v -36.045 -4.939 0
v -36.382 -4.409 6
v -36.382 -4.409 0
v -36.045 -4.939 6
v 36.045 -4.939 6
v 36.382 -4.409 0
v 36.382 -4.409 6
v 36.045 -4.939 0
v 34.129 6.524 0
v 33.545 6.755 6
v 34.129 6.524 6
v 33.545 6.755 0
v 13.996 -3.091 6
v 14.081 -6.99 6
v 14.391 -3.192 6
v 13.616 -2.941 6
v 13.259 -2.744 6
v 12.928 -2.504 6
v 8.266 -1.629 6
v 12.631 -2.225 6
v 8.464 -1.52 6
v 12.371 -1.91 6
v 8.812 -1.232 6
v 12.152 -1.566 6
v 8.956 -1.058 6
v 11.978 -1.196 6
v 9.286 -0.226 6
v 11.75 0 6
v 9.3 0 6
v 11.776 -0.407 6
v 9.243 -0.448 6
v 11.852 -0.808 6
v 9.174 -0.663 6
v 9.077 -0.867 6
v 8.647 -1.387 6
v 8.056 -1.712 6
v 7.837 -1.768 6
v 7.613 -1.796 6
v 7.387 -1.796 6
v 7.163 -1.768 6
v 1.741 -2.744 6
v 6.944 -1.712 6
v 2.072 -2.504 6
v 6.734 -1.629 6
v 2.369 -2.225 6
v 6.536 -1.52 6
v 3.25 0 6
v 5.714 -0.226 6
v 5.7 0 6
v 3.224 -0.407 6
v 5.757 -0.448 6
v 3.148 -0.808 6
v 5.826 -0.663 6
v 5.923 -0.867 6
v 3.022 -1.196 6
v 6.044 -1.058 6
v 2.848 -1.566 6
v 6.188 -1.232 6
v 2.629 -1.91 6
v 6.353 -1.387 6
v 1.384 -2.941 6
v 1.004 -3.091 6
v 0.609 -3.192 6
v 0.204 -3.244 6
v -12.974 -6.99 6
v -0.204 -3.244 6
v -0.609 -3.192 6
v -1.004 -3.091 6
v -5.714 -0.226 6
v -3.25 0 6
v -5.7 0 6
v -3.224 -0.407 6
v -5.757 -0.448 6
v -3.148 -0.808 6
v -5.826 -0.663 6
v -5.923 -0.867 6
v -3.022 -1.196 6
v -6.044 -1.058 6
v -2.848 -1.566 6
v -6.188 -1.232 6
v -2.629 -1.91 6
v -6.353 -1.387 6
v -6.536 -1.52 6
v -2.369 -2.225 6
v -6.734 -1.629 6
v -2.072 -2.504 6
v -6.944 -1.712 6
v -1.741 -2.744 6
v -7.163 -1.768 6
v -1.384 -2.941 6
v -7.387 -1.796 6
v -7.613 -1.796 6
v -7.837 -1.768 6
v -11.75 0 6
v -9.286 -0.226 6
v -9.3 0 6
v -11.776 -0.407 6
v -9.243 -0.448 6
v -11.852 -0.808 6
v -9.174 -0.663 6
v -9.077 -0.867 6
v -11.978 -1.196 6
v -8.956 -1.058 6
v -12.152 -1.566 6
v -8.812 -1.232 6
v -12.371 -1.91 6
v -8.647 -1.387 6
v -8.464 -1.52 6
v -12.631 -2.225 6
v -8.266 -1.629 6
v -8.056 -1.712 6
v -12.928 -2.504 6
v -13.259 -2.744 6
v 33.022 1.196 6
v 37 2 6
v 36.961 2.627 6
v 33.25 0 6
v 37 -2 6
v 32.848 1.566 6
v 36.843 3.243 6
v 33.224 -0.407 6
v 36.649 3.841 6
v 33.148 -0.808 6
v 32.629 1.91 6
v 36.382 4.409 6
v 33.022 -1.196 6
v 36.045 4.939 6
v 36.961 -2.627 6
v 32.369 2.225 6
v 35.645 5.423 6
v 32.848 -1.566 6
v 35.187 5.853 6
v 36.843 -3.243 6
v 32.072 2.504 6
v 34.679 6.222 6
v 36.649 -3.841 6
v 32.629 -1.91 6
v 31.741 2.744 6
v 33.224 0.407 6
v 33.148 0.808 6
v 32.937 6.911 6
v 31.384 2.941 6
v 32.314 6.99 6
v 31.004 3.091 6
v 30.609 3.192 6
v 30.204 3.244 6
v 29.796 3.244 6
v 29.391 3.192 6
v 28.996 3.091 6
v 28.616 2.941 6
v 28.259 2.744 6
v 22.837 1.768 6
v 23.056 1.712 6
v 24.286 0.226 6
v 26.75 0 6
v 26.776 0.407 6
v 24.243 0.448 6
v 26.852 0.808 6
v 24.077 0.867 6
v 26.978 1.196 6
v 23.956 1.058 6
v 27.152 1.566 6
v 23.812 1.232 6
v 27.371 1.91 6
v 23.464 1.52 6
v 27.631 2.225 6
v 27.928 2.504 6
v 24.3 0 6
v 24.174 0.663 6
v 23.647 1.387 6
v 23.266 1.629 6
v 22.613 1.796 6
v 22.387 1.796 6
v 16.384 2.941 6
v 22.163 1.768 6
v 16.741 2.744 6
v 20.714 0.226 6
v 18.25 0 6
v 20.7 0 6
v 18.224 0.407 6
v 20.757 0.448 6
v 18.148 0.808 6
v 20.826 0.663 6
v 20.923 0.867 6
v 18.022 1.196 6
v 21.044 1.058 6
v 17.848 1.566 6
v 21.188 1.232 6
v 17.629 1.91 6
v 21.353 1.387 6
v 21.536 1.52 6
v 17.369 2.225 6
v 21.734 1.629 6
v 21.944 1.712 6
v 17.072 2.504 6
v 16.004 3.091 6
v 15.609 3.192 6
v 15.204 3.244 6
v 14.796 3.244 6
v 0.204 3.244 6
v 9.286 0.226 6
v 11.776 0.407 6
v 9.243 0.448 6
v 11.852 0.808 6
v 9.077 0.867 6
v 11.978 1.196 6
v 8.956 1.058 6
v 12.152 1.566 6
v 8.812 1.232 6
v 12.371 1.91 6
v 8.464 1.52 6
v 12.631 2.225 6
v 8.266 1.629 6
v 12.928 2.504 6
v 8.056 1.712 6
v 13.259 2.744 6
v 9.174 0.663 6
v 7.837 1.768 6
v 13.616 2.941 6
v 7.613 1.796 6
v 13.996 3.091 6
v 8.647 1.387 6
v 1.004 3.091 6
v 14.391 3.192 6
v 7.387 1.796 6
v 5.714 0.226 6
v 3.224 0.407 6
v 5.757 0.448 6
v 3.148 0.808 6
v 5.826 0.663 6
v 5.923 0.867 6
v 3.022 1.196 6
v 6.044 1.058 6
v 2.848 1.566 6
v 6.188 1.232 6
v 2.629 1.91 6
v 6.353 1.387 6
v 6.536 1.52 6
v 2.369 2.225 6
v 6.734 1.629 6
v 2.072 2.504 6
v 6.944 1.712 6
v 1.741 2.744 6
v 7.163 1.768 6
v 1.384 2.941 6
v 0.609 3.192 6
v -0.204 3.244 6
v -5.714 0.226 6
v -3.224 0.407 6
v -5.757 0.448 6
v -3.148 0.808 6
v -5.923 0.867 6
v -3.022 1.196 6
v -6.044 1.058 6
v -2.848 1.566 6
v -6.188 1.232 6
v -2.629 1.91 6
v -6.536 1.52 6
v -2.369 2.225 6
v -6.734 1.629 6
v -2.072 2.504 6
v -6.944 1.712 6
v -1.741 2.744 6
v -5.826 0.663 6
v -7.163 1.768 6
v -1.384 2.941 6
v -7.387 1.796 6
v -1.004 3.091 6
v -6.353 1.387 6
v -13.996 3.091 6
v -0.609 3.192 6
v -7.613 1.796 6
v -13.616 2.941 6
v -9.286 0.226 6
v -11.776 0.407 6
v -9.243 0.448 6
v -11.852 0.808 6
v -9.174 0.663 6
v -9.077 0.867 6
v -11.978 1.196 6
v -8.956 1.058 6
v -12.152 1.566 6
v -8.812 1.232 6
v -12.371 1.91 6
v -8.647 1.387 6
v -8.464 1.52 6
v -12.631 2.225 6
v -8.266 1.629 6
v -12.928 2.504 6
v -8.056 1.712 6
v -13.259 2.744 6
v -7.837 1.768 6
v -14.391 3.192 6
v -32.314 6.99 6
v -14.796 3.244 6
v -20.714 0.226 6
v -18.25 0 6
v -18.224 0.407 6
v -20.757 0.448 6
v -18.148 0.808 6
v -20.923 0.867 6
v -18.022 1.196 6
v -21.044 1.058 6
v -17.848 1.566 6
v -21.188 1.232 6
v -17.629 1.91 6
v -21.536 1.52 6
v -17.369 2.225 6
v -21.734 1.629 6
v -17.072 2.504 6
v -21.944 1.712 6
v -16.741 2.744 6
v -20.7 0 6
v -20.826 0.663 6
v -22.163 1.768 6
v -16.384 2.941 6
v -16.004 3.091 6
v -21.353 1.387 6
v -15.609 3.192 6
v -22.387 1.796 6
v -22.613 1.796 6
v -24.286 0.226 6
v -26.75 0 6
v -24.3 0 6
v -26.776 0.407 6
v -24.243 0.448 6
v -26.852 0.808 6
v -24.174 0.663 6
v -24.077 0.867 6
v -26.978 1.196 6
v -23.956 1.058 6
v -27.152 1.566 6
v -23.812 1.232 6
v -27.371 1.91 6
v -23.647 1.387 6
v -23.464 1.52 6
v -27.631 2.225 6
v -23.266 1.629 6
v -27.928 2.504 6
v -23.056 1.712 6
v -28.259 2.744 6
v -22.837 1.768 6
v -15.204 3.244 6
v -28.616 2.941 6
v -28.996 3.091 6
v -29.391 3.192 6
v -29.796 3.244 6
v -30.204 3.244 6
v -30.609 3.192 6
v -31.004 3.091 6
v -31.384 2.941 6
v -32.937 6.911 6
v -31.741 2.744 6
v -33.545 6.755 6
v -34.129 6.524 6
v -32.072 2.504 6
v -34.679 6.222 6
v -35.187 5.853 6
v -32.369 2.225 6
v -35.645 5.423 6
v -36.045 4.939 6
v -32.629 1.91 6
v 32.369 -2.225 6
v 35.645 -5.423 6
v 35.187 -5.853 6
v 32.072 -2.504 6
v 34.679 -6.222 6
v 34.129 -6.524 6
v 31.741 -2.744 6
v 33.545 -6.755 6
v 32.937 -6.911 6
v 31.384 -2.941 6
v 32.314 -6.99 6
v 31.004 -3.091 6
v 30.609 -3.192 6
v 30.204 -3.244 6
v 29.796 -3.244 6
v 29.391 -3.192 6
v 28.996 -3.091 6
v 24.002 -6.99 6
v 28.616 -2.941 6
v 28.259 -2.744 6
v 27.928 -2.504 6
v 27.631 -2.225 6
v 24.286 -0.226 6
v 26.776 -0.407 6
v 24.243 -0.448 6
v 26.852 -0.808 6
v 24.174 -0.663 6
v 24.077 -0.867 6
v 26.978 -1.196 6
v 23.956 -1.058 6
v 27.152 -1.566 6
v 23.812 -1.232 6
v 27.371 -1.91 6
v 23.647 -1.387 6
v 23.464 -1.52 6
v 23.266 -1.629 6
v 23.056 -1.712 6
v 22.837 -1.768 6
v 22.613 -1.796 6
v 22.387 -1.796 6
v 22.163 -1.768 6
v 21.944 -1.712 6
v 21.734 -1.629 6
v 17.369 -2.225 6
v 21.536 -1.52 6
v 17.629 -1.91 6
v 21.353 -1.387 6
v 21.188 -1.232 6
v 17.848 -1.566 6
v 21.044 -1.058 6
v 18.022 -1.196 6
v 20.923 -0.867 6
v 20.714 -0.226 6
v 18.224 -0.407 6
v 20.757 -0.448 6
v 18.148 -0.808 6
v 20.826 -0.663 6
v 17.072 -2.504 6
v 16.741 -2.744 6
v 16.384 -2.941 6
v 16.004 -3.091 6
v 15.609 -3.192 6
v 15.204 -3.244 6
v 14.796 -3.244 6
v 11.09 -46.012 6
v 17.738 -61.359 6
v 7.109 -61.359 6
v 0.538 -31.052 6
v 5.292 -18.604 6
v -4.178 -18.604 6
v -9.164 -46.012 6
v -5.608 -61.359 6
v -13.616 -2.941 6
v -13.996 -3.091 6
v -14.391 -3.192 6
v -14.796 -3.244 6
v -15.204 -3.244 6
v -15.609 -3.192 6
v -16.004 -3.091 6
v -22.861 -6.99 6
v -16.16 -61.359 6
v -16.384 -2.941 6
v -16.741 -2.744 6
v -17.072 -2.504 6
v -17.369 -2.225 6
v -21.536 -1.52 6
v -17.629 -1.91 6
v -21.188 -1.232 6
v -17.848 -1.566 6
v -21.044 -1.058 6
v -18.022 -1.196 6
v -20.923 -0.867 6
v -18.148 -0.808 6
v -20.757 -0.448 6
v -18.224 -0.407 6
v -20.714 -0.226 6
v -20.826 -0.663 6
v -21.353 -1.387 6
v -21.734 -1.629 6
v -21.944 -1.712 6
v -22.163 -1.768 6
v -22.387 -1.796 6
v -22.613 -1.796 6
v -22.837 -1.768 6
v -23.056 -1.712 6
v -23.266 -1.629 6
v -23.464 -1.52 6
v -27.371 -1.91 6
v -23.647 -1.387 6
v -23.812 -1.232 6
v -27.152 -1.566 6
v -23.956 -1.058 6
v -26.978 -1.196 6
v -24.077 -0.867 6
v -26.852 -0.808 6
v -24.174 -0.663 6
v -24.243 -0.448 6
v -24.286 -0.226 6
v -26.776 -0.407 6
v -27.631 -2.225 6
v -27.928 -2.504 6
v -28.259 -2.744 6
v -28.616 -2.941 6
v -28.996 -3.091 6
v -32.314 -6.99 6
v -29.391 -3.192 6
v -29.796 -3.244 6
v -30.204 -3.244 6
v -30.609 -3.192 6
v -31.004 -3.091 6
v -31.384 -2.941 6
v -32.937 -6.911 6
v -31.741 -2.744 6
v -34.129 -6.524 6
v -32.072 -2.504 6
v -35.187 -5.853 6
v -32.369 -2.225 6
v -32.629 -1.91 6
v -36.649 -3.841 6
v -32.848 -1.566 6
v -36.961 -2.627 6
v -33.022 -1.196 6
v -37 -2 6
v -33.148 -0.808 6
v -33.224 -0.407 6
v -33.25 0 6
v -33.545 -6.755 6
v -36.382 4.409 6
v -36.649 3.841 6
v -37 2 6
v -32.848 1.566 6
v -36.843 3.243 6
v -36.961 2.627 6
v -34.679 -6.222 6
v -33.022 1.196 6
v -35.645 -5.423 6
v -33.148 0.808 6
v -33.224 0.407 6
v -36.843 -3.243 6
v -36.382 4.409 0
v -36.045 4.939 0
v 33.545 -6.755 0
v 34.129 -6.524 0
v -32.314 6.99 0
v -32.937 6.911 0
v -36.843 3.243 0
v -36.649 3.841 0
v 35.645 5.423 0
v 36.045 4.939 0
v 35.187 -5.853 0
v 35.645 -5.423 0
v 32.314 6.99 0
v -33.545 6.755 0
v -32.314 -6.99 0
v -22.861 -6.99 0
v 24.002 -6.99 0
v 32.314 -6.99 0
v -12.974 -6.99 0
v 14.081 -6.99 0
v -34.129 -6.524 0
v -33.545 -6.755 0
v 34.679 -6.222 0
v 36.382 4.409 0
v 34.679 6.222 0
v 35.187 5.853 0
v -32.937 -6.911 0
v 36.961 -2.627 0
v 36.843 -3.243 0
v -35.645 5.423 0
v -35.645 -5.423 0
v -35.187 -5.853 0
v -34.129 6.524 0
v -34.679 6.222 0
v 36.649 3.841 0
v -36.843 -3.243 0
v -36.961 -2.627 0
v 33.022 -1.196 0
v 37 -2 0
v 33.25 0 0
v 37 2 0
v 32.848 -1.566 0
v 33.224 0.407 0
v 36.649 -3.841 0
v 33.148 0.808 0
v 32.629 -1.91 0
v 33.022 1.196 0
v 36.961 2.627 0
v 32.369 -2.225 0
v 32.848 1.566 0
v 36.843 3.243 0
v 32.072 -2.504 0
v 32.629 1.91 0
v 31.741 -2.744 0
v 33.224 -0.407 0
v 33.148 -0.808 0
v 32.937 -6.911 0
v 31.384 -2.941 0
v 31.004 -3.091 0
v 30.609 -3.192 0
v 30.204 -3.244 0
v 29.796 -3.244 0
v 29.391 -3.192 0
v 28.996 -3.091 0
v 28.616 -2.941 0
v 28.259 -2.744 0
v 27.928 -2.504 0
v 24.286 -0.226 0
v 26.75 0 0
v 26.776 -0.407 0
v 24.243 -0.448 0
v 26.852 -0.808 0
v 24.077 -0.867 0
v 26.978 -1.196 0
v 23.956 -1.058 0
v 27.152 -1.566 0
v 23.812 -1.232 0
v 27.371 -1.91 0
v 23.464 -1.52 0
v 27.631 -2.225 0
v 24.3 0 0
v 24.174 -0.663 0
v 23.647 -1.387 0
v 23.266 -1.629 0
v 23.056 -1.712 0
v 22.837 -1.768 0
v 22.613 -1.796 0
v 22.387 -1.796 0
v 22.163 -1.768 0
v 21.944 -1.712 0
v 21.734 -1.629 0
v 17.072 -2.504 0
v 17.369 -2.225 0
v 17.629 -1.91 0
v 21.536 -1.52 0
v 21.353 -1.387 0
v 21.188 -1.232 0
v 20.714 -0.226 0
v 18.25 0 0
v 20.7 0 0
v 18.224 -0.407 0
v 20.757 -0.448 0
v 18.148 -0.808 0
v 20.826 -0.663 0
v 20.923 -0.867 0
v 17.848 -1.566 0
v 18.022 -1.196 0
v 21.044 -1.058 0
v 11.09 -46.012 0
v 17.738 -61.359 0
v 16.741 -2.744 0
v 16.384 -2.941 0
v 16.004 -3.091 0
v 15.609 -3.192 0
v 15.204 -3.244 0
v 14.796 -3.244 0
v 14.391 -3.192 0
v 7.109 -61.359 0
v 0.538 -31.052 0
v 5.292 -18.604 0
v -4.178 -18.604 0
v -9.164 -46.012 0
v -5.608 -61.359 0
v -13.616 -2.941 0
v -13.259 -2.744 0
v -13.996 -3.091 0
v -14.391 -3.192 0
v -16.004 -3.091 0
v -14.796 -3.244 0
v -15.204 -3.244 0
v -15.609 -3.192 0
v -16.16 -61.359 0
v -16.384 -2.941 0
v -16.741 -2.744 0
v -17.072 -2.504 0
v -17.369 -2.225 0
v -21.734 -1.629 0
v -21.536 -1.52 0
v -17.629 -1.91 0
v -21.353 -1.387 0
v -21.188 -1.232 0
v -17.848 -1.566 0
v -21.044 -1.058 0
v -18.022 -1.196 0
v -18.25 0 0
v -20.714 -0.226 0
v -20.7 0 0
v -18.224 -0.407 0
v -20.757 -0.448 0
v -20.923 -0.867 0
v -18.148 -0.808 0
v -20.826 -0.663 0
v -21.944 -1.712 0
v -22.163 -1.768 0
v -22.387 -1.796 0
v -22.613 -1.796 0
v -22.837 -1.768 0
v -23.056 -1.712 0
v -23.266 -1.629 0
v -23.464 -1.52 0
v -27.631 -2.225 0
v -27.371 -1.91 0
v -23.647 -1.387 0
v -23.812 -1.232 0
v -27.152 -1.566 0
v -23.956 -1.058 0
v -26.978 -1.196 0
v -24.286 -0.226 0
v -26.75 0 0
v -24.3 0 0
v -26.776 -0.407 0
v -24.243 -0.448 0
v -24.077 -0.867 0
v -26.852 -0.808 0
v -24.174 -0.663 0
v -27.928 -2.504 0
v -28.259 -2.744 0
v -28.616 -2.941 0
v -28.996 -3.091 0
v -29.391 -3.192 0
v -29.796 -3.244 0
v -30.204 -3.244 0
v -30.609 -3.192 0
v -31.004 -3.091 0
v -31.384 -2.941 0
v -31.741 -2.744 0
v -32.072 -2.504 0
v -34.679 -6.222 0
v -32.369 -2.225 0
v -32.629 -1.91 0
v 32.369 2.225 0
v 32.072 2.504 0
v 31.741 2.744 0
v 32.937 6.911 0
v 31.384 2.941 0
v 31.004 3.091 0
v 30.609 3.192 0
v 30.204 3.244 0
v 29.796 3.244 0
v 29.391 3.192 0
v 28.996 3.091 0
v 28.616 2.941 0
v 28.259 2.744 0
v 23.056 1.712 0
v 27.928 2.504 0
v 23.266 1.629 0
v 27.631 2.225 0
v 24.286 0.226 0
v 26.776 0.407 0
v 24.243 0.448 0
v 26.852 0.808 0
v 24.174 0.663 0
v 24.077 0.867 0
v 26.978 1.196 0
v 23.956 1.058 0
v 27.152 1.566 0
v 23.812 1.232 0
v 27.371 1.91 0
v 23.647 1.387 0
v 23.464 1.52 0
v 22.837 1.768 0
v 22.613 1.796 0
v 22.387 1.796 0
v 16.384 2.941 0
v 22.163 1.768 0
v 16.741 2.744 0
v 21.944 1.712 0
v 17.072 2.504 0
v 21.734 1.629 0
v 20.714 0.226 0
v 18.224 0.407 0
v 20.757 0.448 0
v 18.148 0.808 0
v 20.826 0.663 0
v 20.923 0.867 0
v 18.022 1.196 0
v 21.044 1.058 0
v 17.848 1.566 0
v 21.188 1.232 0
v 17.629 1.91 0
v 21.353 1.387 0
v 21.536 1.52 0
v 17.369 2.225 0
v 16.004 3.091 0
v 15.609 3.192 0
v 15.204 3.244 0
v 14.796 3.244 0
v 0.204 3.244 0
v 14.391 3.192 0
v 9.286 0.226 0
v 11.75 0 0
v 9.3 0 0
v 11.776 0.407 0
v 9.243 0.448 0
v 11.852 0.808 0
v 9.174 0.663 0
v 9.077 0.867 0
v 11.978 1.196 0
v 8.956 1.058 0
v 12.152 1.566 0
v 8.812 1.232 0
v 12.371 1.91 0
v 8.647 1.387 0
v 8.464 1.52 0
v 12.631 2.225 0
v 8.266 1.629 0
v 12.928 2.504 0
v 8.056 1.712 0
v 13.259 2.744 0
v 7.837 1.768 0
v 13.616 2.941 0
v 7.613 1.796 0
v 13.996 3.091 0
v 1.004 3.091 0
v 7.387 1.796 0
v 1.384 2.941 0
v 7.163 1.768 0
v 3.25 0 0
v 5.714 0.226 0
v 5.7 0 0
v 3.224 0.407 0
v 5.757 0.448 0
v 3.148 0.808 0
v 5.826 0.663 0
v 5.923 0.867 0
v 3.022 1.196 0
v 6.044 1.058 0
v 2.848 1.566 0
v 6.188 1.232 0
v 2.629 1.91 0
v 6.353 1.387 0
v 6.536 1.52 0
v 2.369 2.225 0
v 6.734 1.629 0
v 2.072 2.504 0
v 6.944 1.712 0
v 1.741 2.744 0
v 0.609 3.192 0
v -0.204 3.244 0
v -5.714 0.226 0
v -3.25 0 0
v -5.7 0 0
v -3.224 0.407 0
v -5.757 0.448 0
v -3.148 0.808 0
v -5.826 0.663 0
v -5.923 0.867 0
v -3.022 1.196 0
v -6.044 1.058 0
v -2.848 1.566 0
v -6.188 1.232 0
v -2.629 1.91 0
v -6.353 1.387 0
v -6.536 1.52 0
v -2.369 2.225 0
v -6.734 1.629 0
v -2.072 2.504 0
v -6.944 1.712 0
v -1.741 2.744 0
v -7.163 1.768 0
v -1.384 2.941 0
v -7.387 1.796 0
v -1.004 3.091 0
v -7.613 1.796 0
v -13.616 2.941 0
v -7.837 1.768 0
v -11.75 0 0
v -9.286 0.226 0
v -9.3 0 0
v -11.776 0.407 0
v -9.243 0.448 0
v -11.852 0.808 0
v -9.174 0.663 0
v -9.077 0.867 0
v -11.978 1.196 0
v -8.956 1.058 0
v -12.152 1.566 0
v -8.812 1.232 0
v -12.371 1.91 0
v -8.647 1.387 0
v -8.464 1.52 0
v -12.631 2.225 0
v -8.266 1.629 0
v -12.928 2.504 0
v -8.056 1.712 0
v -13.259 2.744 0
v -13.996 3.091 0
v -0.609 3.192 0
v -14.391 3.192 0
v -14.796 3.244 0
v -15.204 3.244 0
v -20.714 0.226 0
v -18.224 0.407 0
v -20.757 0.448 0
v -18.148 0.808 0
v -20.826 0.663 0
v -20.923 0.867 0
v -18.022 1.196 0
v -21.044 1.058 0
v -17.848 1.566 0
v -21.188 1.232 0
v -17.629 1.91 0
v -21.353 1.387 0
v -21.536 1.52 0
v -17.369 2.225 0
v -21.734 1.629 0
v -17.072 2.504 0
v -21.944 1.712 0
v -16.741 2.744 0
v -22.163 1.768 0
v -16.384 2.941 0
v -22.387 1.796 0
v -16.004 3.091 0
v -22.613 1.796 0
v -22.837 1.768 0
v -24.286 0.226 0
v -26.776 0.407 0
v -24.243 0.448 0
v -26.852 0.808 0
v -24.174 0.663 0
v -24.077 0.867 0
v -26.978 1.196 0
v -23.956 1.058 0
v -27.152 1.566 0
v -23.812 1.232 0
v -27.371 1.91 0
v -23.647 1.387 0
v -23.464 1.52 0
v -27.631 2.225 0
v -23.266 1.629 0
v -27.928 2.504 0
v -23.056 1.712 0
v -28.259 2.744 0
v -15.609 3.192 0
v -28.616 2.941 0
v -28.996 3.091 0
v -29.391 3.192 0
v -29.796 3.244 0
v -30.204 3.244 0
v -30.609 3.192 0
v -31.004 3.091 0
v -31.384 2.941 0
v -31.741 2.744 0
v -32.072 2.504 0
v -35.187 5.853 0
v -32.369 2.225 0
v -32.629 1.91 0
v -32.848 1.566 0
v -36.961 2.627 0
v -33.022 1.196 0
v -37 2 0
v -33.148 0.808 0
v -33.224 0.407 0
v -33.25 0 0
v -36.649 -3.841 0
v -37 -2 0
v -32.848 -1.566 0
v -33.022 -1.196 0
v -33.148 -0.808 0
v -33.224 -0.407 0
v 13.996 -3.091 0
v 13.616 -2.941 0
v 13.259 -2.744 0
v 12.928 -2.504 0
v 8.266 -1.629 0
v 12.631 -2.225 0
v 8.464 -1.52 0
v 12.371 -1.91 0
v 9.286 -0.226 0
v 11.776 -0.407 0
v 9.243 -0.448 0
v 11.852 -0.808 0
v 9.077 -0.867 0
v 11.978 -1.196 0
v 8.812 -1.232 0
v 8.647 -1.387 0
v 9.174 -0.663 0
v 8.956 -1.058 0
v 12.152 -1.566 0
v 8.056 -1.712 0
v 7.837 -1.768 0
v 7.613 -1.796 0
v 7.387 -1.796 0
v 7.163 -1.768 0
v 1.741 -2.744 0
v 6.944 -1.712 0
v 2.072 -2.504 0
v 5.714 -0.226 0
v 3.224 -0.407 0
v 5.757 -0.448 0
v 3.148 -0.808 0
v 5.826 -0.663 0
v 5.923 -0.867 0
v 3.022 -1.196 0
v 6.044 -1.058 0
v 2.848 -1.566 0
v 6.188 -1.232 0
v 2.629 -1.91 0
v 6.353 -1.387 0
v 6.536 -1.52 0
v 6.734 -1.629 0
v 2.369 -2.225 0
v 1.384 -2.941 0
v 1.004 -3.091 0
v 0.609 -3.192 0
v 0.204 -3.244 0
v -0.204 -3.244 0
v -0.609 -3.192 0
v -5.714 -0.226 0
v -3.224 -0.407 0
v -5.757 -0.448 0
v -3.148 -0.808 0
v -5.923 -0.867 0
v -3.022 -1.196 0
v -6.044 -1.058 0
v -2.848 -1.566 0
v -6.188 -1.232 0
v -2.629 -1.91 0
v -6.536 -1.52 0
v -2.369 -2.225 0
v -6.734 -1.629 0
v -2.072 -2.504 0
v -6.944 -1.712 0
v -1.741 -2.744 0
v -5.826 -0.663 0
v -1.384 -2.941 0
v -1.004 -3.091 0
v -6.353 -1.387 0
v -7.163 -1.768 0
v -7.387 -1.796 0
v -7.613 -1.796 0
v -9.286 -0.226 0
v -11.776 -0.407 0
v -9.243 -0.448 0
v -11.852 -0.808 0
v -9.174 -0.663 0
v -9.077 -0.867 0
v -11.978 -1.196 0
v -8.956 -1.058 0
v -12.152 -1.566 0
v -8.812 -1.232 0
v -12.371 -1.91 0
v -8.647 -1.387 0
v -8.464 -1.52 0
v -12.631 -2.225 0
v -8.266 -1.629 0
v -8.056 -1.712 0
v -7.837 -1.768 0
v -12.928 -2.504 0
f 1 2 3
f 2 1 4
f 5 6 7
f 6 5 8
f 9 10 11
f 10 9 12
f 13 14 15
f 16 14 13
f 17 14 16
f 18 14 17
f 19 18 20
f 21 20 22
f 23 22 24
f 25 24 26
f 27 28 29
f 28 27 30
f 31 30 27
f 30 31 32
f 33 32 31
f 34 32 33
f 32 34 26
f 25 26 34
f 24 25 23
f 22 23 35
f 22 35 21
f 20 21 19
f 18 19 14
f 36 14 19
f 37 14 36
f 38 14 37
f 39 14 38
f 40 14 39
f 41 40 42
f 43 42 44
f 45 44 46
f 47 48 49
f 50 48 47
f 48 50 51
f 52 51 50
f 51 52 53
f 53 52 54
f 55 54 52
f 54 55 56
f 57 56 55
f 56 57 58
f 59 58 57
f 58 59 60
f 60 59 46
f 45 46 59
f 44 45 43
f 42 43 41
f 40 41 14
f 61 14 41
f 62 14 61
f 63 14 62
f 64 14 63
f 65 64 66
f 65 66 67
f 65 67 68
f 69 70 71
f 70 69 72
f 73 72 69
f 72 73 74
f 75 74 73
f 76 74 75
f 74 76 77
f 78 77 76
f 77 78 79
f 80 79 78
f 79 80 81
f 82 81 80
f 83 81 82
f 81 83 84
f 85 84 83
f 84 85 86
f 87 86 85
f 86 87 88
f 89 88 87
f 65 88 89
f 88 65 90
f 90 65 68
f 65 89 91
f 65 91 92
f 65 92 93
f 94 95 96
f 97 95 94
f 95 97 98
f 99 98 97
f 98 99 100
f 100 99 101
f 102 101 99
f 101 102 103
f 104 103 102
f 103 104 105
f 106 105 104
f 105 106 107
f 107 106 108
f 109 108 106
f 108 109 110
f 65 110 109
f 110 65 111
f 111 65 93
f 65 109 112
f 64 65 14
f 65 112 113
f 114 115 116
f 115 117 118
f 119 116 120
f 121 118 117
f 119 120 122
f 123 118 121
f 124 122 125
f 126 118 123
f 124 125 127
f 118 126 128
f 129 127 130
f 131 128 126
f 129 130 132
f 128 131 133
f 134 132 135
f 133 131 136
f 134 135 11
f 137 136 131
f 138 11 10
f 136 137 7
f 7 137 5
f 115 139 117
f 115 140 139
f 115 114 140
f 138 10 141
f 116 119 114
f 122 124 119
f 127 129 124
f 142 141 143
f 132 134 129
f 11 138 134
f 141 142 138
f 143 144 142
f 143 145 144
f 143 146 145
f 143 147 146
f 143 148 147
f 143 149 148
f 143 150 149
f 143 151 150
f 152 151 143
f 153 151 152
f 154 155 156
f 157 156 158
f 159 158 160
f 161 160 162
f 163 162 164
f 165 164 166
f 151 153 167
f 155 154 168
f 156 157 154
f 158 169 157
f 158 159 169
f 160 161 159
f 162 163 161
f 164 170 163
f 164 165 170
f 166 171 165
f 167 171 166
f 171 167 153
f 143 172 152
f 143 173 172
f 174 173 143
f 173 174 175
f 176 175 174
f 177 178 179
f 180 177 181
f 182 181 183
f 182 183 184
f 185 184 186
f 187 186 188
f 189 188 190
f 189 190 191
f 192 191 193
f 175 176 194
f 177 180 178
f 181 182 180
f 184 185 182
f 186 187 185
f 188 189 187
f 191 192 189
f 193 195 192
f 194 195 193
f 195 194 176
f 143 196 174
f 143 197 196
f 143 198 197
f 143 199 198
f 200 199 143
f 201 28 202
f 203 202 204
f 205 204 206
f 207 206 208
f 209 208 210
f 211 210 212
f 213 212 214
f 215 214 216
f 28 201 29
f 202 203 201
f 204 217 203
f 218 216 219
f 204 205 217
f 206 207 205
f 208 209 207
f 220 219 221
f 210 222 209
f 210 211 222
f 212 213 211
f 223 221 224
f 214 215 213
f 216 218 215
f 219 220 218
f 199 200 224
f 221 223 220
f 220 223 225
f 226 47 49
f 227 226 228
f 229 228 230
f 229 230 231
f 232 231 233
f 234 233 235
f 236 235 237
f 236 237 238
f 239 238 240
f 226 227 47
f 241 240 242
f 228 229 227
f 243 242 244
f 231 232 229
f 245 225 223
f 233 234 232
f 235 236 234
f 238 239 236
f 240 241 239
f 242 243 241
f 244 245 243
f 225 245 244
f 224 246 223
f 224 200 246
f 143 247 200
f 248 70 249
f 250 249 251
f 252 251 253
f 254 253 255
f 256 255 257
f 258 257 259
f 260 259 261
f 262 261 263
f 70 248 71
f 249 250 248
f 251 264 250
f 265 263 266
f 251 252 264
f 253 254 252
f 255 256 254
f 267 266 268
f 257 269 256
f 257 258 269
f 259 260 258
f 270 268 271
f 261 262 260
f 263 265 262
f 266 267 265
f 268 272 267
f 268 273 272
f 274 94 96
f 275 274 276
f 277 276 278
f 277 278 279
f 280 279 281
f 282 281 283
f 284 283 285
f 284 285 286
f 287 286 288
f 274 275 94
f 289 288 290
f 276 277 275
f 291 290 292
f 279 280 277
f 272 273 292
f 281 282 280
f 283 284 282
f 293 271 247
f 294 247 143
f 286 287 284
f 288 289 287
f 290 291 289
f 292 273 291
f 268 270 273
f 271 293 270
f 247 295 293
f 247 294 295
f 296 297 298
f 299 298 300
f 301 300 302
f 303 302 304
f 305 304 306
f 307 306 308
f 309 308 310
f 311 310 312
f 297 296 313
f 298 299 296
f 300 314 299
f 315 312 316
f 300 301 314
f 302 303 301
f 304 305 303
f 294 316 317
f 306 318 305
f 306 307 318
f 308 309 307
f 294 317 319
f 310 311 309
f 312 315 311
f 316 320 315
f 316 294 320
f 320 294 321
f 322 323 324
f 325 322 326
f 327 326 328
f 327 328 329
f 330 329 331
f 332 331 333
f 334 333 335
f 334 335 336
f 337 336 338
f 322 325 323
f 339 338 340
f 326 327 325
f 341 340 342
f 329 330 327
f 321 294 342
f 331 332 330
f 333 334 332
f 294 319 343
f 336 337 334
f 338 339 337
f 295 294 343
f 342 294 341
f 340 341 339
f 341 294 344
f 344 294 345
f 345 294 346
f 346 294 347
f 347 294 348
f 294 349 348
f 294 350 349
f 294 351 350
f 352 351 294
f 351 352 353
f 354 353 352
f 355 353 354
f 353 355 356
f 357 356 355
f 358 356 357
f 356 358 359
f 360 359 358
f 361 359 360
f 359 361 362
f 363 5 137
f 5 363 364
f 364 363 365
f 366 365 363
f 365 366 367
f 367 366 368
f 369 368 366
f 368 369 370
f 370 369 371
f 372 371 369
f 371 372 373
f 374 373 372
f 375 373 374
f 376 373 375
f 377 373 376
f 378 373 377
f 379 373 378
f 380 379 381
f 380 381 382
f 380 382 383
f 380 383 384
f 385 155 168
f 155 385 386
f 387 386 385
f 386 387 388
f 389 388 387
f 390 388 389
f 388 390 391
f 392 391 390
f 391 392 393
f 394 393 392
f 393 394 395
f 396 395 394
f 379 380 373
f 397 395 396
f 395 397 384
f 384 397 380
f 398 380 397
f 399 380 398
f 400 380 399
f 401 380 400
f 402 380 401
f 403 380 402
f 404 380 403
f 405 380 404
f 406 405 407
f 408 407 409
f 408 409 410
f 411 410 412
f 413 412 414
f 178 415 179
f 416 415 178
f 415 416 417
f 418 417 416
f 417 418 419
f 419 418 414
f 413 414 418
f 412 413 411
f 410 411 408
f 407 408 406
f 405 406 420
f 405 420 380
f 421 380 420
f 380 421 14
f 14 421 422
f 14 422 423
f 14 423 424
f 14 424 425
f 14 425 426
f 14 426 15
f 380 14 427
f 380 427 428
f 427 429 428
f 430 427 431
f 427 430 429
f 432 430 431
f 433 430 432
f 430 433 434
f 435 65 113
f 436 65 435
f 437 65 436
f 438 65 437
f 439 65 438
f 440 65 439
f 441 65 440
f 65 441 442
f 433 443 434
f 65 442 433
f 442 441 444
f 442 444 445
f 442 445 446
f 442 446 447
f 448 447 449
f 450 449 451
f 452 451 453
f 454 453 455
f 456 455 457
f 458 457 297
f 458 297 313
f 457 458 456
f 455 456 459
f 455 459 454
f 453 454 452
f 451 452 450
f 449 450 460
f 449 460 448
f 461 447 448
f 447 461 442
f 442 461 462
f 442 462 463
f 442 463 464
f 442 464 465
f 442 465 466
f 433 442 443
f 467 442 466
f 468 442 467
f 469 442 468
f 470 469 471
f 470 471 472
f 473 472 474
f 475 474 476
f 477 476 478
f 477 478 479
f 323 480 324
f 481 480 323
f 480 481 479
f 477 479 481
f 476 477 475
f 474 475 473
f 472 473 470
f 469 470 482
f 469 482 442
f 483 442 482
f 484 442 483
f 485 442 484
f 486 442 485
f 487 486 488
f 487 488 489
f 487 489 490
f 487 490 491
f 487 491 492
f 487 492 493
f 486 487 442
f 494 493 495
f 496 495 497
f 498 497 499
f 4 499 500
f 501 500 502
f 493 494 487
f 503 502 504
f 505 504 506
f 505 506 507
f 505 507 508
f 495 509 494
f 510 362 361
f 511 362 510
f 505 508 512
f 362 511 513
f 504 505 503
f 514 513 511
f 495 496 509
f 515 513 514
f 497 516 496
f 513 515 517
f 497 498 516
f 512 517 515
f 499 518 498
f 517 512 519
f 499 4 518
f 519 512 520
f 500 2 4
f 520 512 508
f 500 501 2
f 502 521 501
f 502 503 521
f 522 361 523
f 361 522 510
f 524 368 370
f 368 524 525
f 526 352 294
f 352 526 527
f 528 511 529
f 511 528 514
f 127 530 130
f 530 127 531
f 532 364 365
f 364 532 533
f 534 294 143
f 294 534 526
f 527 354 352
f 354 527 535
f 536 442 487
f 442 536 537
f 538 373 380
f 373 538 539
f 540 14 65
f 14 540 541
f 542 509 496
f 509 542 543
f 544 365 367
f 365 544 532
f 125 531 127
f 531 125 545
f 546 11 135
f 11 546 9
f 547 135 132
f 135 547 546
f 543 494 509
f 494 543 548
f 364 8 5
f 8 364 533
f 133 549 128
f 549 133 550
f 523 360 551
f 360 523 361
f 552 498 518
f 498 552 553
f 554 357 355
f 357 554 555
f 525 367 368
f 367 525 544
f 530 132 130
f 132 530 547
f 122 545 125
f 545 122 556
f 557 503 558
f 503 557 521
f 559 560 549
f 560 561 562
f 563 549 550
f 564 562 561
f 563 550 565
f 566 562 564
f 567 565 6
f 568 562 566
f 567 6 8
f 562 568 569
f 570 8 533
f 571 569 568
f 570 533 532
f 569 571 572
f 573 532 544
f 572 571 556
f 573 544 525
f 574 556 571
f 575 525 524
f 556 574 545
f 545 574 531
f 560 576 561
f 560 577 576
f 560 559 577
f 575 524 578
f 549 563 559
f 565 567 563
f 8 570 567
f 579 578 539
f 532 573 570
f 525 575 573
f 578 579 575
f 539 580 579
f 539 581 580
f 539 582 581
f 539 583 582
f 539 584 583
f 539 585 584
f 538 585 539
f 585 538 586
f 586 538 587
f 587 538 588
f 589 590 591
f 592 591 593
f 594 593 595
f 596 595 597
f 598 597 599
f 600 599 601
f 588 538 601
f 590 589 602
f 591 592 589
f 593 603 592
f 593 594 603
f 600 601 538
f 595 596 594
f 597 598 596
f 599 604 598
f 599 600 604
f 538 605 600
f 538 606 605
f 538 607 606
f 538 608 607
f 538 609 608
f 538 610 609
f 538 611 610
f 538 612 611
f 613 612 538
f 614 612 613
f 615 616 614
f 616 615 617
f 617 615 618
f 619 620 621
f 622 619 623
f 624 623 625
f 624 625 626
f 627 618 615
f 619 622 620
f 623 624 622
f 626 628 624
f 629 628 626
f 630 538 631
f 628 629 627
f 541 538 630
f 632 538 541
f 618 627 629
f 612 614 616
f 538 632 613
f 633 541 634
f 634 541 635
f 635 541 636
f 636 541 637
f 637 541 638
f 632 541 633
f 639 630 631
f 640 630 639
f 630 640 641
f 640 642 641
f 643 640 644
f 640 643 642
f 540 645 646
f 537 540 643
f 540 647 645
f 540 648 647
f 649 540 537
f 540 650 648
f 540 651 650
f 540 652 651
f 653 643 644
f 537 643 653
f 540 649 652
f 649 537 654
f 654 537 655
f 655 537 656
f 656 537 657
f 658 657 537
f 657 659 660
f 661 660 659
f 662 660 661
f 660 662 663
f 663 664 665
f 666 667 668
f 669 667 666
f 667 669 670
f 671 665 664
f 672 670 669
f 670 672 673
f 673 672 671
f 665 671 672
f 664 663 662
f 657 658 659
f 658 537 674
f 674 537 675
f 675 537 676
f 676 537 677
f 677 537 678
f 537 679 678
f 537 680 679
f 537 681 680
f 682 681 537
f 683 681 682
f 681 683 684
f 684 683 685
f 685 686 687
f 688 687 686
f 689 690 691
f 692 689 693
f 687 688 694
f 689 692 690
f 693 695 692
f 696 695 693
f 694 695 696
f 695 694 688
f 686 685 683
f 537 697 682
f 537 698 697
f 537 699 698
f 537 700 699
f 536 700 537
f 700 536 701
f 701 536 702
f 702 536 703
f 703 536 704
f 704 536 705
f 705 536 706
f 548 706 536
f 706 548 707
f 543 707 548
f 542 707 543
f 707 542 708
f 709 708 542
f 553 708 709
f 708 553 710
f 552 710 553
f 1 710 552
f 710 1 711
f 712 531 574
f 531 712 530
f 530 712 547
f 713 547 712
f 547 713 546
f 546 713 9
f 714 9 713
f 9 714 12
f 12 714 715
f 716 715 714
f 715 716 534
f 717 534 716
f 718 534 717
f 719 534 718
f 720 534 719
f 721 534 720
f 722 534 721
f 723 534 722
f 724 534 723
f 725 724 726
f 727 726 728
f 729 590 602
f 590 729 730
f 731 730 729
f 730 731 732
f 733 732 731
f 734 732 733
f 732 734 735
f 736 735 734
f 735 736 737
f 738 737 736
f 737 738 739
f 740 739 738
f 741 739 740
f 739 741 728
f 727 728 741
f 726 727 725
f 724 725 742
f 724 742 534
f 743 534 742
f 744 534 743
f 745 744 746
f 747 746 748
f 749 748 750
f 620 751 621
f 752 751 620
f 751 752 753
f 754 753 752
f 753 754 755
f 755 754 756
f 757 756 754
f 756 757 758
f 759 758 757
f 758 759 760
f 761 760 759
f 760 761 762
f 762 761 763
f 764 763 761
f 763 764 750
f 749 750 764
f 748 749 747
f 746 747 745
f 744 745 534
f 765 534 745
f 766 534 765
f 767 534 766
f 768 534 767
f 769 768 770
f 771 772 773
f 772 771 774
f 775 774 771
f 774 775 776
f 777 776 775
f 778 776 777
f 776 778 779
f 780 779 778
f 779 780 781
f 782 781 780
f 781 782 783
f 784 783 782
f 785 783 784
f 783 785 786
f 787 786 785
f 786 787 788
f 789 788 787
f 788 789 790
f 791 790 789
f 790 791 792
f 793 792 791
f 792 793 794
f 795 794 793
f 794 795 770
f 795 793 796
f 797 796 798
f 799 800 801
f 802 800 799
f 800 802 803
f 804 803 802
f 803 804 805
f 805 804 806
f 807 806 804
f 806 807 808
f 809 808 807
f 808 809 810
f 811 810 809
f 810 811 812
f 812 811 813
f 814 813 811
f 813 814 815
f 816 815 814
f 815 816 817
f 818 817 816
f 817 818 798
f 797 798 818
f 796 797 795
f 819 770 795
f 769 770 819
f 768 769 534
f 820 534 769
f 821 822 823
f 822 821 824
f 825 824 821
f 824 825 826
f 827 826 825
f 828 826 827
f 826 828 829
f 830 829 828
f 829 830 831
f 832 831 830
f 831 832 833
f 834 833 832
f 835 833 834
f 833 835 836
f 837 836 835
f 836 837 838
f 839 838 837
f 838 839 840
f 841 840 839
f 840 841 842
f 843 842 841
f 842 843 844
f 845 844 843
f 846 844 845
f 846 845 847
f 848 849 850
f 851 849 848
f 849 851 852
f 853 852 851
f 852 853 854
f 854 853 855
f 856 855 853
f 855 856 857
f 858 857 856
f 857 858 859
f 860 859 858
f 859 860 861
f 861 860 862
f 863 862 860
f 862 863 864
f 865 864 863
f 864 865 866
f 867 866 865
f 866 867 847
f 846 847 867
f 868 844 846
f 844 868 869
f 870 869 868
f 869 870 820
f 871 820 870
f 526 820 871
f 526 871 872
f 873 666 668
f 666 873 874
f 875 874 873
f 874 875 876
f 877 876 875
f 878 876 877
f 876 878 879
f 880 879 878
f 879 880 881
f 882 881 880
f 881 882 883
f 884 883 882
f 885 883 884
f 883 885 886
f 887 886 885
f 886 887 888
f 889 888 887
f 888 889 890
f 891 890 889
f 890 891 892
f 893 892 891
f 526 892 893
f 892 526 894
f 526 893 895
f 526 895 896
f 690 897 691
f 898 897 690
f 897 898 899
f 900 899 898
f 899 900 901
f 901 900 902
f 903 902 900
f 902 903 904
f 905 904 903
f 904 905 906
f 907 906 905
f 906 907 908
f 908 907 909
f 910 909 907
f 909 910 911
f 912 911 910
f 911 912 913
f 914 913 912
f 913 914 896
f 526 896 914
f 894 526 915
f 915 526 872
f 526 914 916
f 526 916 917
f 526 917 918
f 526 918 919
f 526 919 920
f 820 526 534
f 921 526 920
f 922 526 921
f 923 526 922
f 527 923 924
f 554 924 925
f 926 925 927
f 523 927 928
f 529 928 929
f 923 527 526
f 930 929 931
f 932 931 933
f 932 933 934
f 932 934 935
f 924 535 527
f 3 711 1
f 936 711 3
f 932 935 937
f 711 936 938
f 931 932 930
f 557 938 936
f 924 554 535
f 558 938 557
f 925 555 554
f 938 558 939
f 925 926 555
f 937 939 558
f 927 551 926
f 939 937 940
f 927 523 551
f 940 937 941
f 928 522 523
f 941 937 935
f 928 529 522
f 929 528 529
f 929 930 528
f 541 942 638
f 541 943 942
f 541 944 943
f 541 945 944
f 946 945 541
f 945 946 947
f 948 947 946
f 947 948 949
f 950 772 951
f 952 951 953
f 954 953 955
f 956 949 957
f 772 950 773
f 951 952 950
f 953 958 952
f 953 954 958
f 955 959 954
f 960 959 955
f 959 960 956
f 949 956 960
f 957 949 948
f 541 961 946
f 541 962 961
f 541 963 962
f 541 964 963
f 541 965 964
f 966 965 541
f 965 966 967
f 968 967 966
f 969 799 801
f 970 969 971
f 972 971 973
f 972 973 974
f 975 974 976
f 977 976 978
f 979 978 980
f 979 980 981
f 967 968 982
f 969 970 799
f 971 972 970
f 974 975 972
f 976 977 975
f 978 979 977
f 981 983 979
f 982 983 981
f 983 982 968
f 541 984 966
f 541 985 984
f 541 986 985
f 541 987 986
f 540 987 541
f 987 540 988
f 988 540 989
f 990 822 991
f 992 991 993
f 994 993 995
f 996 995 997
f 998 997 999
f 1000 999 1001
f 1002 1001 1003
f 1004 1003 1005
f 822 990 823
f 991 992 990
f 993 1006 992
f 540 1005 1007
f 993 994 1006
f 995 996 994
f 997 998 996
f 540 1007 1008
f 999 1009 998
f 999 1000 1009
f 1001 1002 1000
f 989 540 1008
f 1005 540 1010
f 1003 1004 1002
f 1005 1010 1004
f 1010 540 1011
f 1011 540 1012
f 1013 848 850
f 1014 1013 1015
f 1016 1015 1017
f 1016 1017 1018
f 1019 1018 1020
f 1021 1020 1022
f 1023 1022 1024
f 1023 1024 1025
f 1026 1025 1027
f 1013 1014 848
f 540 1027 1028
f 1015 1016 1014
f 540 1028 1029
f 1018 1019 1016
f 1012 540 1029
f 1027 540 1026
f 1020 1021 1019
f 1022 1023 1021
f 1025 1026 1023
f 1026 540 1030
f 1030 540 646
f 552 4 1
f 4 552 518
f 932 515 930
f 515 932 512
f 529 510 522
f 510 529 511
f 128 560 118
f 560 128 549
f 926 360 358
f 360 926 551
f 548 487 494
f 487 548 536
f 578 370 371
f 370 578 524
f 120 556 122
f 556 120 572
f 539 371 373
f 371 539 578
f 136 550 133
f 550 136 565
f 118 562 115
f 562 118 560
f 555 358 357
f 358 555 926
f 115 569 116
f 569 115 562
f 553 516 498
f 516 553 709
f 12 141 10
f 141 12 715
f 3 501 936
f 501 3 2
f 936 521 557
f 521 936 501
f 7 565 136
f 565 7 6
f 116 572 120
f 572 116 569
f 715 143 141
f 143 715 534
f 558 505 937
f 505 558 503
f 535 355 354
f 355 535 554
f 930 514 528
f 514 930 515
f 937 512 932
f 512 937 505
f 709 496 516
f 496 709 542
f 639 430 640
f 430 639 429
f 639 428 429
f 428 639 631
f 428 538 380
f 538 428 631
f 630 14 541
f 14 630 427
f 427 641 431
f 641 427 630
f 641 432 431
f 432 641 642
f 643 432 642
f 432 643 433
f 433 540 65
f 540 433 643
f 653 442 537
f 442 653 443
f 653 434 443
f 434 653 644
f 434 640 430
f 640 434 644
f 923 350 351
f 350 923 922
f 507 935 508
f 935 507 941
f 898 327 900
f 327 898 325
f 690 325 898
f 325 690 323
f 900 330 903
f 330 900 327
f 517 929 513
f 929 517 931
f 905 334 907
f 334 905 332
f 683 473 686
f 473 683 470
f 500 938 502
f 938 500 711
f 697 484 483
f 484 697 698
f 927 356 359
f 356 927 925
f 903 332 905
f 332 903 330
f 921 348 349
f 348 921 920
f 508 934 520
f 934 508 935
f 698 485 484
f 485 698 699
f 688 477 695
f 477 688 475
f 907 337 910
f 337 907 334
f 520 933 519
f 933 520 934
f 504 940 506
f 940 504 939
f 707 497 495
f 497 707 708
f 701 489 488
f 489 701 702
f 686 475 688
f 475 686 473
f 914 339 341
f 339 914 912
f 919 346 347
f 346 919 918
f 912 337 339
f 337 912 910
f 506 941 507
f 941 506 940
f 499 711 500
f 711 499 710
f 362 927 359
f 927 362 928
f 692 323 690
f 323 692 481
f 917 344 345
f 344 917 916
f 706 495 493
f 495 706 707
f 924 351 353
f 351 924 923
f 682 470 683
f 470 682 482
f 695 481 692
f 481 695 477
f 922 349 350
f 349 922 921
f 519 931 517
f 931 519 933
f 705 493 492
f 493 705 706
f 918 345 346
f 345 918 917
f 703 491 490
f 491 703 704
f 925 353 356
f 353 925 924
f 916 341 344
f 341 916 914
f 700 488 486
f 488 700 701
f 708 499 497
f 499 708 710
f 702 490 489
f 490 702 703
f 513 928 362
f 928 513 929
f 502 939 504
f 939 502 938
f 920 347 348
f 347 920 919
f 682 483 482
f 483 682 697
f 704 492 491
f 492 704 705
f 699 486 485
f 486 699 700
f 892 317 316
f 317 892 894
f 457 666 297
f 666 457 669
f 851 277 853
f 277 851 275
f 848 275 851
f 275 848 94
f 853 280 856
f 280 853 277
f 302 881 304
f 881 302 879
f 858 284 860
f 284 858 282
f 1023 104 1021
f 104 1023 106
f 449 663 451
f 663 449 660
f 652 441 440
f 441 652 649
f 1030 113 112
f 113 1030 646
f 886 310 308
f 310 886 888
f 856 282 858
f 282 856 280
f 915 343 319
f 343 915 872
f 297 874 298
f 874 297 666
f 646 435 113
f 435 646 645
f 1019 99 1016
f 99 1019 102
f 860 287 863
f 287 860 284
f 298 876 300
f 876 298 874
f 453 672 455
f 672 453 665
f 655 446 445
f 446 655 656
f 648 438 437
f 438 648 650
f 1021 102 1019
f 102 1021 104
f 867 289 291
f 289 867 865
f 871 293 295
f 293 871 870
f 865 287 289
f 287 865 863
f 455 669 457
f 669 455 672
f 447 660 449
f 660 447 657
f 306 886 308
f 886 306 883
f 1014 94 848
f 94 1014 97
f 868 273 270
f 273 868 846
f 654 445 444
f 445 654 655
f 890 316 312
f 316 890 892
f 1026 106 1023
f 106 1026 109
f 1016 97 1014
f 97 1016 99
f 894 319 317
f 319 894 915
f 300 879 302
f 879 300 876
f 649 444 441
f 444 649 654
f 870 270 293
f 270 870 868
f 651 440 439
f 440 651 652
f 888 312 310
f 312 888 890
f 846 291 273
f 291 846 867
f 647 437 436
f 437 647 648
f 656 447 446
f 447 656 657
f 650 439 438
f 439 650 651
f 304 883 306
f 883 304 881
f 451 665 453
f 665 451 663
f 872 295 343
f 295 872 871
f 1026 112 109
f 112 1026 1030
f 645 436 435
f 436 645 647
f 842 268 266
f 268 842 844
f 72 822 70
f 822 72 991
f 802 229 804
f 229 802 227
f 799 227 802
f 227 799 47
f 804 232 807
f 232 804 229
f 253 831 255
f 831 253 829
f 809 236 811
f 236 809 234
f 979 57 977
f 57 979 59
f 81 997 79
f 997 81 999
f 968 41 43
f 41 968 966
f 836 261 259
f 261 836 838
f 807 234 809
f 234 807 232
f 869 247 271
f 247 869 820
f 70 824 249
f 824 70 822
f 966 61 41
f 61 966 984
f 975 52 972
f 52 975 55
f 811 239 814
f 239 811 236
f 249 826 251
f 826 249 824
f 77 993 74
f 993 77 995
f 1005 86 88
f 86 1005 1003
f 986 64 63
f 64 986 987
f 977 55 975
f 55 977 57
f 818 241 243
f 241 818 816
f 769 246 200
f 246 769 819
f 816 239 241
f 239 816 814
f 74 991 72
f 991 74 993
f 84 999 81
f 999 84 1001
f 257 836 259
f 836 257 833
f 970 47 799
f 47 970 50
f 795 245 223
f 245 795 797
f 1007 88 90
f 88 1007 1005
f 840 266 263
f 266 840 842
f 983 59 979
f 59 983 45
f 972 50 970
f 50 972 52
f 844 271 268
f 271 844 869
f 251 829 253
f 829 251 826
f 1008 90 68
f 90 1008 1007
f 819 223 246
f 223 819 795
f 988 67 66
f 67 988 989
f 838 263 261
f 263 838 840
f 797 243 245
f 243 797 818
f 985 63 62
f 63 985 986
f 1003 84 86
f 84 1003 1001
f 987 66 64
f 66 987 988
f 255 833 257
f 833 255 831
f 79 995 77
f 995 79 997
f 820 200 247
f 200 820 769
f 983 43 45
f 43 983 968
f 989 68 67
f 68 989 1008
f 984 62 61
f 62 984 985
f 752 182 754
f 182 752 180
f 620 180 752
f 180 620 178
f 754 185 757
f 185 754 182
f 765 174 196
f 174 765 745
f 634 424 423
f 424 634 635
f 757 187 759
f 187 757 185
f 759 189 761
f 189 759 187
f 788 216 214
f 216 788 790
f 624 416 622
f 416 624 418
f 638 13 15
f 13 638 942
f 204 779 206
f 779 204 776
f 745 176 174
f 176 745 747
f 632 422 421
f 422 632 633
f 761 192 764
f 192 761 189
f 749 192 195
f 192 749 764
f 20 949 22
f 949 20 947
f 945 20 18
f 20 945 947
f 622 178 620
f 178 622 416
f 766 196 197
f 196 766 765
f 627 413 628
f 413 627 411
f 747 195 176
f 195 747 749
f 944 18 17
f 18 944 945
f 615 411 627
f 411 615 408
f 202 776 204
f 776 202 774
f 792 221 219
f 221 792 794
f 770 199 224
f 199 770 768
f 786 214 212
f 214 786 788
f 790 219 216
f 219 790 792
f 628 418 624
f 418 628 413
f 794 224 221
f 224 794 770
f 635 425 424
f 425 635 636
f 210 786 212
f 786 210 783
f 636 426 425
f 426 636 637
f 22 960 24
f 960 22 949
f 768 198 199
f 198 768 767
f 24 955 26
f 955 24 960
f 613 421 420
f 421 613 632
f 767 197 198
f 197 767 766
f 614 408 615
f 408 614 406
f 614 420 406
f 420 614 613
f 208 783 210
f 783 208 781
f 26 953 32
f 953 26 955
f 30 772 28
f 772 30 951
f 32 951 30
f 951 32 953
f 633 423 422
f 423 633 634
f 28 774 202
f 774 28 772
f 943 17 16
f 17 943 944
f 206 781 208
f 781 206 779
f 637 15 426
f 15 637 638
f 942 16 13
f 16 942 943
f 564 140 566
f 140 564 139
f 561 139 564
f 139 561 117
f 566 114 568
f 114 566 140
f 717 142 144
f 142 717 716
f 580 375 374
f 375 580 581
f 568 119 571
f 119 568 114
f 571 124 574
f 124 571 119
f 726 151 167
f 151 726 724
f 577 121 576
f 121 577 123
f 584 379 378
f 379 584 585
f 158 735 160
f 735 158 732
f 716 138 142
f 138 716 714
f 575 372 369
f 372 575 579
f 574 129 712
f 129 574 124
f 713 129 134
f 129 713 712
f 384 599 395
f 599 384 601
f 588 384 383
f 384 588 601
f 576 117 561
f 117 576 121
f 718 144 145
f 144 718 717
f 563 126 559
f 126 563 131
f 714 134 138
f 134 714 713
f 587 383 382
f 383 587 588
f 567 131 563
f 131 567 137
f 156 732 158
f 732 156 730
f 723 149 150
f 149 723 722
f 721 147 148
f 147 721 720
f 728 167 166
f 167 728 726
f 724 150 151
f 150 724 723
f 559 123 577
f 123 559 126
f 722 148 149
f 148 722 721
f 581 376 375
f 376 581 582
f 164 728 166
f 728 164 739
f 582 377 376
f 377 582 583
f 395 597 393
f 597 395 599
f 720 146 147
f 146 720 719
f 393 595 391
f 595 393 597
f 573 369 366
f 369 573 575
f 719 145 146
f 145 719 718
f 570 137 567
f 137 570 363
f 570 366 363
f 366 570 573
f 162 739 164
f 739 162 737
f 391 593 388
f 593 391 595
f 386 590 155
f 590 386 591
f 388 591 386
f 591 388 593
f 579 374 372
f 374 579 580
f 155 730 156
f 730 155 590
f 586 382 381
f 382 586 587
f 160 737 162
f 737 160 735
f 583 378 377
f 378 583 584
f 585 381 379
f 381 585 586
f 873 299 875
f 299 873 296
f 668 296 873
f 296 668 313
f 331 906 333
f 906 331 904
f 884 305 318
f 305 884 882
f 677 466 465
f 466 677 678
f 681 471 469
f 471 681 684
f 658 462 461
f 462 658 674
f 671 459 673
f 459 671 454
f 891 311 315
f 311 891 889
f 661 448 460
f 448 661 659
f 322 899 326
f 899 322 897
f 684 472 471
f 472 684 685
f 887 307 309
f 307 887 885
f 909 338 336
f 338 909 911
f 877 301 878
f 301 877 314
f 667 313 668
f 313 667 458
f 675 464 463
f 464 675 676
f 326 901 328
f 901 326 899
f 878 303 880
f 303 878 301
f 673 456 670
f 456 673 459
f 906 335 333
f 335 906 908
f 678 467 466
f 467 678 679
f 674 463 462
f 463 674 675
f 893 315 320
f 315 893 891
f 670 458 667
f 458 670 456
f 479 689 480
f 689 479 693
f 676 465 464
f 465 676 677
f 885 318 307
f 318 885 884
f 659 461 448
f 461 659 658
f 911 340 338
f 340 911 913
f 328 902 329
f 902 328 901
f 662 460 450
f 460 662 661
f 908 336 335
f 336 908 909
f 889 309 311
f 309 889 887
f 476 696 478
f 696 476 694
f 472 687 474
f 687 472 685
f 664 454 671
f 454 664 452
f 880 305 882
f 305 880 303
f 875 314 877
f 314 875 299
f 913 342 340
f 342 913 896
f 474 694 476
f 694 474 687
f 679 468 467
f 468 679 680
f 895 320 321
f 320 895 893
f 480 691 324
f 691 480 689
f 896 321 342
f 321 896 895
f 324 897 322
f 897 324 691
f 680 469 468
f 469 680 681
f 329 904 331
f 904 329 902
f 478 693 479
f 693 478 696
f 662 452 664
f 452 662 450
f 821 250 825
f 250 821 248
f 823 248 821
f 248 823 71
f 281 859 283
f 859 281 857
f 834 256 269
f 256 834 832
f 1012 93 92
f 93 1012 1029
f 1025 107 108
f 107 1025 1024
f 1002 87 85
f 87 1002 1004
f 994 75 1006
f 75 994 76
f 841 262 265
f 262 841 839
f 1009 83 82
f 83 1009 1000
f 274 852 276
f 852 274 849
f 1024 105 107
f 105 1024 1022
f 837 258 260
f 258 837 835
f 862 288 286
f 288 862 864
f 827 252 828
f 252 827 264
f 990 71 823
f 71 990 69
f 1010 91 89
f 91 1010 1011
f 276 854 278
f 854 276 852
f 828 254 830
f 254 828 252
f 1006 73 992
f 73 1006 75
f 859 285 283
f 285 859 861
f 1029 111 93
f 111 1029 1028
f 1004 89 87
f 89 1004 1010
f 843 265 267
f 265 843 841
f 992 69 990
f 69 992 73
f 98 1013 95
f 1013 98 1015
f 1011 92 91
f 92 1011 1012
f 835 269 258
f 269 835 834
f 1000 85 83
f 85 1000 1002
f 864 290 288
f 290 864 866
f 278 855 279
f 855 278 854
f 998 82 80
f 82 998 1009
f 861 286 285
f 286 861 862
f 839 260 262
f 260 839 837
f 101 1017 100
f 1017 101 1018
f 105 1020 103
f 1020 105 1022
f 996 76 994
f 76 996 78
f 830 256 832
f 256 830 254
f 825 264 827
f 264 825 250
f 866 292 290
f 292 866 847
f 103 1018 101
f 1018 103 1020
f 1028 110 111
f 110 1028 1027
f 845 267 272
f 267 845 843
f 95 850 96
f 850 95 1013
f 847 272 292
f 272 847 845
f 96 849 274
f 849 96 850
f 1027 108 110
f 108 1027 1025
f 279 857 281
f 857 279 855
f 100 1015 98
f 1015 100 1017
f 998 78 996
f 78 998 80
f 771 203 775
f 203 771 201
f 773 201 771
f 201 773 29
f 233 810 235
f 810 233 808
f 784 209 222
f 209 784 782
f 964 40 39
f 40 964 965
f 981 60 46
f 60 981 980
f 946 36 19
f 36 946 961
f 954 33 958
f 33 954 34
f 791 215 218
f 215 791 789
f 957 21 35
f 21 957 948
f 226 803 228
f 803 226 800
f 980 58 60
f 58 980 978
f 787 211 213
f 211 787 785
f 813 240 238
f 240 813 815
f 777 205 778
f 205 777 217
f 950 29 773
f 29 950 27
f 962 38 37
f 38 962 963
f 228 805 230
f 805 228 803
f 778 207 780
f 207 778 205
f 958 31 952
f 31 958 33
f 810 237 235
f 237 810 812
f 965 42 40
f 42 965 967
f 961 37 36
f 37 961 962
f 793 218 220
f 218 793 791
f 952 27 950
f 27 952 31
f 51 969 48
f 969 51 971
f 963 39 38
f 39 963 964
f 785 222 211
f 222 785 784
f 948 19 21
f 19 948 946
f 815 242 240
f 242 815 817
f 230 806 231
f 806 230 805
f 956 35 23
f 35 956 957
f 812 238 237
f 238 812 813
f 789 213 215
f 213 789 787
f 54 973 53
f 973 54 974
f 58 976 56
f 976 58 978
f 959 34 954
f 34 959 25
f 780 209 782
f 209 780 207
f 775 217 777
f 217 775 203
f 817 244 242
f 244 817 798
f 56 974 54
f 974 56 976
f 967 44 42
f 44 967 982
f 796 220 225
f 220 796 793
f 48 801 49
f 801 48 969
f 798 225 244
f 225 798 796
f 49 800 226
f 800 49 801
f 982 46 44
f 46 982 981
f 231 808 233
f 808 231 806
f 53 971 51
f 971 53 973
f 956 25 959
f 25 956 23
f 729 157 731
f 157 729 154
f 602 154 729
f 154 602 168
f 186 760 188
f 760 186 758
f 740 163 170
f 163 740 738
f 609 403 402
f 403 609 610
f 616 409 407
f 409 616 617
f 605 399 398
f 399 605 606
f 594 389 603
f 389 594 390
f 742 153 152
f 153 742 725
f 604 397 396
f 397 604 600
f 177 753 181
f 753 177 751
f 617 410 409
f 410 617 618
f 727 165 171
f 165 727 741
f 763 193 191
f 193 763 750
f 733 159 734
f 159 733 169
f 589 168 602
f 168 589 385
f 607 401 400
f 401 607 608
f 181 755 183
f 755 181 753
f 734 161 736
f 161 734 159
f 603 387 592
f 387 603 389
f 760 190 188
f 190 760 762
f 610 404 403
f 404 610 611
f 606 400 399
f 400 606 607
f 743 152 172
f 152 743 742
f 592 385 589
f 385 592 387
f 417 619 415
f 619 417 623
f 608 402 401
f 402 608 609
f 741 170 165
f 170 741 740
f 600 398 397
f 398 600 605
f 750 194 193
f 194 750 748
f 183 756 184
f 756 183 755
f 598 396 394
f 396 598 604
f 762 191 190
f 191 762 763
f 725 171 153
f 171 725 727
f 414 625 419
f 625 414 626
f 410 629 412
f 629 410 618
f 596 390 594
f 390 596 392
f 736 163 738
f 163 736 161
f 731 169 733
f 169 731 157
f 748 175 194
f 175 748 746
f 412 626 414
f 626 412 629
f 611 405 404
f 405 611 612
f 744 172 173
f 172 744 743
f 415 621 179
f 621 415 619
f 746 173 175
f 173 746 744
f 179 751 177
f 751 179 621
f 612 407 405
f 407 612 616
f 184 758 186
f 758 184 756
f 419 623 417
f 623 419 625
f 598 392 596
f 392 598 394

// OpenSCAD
$fn = 50;


difference() {
	union() {
		hull() {
			translate(v = [-32.0000000000, 2.0000000000, 0]) {
				cylinder(h = 6, r = 5);
			}
			translate(v = [32.0000000000, 2.0000000000, 0]) {
				cylinder(h = 6, r = 5);
			}
			translate(v = [-32.0000000000, -2.0000000000, 0]) {
				cylinder(h = 6, r = 5);
			}
			translate(v = [32.0000000000, -2.0000000000, 0]) {
				cylinder(h = 6, r = 5);
			}
		}
		translate(v = [0, -5, 0]) {
			linear_extrude(height = 6) {
				text(font = "DejaVu Sans Mono:style=Bold", halign = "center", size = 57.0000000000, text = "W", valign = "top");
			}
		}
	}
	union() {
		translate(v = [-30.0000000000, 0.0000000000, 0]) {
			translate(v = [0, 0, -100]) {
				cylinder(h = 200, r = 3.2500000000);
			}
		}
		translate(v = [-15.0000000000, 0.0000000000, 0]) {
			translate(v = [0, 0, -100]) {
				cylinder(h = 200, r = 3.2500000000);
			}
		}
		translate(v = [0, 0, -100]) {
			cylinder(h = 200, r = 3.2500000000);
		}
		translate(v = [15.0000000000, 0.0000000000, 0]) {
			translate(v = [0, 0, -100]) {
				cylinder(h = 200, r = 3.2500000000);
			}
		}
		translate(v = [30.0000000000, 0.0000000000, 0]) {
			translate(v = [0, 0, -100]) {
				cylinder(h = 200, r = 3.2500000000);
			}
		}
		translate(v = [-30.0000000000, 0.0000000000, 0]) {
			translate(v = [0, 0, -100]) {
				cylinder(h = 200, r = 1.8000000000);
			}
		}
		translate(v = [-22.5000000000, 0.0000000000, 0]) {
			translate(v = [0, 0, -100]) {
				cylinder(h = 200, r = 1.8000000000);
			}
		}
		translate(v = [-15.0000000000, 0.0000000000, 0]) {
			translate(v = [0, 0, -100]) {
				cylinder(h = 200, r = 1.8000000000);
			}
		}
		translate(v = [-7.5000000000, 0.0000000000, 0]) {
			translate(v = [0, 0, -100]) {
				cylinder(h = 200, r = 1.8000000000);
			}
		}
		translate(v = [0, 0, -100]) {
			cylinder(h = 200, r = 1.8000000000);
		}
		translate(v = [7.5000000000, 0.0000000000, 0]) {
			translate(v = [0, 0, -100]) {
				cylinder(h = 200, r = 1.8000000000);
			}
		}
		translate(v = [15.0000000000, 0.0000000000, 0]) {
			translate(v = [0, 0, -100]) {
				cylinder(h = 200, r = 1.8000000000);
			}
		}
		translate(v = [22.5000000000, 0.0000000000, 0]) {
			translate(v = [0, 0, -100]) {
				cylinder(h = 200, r = 1.8000000000);
			}
		}
		translate(v = [30.0000000000, 0.0000000000, 0]) {
			translate(v = [0, 0, -100]) {
				cylinder(h = 200, r = 1.8000000000);
			}
		}
	}
}
